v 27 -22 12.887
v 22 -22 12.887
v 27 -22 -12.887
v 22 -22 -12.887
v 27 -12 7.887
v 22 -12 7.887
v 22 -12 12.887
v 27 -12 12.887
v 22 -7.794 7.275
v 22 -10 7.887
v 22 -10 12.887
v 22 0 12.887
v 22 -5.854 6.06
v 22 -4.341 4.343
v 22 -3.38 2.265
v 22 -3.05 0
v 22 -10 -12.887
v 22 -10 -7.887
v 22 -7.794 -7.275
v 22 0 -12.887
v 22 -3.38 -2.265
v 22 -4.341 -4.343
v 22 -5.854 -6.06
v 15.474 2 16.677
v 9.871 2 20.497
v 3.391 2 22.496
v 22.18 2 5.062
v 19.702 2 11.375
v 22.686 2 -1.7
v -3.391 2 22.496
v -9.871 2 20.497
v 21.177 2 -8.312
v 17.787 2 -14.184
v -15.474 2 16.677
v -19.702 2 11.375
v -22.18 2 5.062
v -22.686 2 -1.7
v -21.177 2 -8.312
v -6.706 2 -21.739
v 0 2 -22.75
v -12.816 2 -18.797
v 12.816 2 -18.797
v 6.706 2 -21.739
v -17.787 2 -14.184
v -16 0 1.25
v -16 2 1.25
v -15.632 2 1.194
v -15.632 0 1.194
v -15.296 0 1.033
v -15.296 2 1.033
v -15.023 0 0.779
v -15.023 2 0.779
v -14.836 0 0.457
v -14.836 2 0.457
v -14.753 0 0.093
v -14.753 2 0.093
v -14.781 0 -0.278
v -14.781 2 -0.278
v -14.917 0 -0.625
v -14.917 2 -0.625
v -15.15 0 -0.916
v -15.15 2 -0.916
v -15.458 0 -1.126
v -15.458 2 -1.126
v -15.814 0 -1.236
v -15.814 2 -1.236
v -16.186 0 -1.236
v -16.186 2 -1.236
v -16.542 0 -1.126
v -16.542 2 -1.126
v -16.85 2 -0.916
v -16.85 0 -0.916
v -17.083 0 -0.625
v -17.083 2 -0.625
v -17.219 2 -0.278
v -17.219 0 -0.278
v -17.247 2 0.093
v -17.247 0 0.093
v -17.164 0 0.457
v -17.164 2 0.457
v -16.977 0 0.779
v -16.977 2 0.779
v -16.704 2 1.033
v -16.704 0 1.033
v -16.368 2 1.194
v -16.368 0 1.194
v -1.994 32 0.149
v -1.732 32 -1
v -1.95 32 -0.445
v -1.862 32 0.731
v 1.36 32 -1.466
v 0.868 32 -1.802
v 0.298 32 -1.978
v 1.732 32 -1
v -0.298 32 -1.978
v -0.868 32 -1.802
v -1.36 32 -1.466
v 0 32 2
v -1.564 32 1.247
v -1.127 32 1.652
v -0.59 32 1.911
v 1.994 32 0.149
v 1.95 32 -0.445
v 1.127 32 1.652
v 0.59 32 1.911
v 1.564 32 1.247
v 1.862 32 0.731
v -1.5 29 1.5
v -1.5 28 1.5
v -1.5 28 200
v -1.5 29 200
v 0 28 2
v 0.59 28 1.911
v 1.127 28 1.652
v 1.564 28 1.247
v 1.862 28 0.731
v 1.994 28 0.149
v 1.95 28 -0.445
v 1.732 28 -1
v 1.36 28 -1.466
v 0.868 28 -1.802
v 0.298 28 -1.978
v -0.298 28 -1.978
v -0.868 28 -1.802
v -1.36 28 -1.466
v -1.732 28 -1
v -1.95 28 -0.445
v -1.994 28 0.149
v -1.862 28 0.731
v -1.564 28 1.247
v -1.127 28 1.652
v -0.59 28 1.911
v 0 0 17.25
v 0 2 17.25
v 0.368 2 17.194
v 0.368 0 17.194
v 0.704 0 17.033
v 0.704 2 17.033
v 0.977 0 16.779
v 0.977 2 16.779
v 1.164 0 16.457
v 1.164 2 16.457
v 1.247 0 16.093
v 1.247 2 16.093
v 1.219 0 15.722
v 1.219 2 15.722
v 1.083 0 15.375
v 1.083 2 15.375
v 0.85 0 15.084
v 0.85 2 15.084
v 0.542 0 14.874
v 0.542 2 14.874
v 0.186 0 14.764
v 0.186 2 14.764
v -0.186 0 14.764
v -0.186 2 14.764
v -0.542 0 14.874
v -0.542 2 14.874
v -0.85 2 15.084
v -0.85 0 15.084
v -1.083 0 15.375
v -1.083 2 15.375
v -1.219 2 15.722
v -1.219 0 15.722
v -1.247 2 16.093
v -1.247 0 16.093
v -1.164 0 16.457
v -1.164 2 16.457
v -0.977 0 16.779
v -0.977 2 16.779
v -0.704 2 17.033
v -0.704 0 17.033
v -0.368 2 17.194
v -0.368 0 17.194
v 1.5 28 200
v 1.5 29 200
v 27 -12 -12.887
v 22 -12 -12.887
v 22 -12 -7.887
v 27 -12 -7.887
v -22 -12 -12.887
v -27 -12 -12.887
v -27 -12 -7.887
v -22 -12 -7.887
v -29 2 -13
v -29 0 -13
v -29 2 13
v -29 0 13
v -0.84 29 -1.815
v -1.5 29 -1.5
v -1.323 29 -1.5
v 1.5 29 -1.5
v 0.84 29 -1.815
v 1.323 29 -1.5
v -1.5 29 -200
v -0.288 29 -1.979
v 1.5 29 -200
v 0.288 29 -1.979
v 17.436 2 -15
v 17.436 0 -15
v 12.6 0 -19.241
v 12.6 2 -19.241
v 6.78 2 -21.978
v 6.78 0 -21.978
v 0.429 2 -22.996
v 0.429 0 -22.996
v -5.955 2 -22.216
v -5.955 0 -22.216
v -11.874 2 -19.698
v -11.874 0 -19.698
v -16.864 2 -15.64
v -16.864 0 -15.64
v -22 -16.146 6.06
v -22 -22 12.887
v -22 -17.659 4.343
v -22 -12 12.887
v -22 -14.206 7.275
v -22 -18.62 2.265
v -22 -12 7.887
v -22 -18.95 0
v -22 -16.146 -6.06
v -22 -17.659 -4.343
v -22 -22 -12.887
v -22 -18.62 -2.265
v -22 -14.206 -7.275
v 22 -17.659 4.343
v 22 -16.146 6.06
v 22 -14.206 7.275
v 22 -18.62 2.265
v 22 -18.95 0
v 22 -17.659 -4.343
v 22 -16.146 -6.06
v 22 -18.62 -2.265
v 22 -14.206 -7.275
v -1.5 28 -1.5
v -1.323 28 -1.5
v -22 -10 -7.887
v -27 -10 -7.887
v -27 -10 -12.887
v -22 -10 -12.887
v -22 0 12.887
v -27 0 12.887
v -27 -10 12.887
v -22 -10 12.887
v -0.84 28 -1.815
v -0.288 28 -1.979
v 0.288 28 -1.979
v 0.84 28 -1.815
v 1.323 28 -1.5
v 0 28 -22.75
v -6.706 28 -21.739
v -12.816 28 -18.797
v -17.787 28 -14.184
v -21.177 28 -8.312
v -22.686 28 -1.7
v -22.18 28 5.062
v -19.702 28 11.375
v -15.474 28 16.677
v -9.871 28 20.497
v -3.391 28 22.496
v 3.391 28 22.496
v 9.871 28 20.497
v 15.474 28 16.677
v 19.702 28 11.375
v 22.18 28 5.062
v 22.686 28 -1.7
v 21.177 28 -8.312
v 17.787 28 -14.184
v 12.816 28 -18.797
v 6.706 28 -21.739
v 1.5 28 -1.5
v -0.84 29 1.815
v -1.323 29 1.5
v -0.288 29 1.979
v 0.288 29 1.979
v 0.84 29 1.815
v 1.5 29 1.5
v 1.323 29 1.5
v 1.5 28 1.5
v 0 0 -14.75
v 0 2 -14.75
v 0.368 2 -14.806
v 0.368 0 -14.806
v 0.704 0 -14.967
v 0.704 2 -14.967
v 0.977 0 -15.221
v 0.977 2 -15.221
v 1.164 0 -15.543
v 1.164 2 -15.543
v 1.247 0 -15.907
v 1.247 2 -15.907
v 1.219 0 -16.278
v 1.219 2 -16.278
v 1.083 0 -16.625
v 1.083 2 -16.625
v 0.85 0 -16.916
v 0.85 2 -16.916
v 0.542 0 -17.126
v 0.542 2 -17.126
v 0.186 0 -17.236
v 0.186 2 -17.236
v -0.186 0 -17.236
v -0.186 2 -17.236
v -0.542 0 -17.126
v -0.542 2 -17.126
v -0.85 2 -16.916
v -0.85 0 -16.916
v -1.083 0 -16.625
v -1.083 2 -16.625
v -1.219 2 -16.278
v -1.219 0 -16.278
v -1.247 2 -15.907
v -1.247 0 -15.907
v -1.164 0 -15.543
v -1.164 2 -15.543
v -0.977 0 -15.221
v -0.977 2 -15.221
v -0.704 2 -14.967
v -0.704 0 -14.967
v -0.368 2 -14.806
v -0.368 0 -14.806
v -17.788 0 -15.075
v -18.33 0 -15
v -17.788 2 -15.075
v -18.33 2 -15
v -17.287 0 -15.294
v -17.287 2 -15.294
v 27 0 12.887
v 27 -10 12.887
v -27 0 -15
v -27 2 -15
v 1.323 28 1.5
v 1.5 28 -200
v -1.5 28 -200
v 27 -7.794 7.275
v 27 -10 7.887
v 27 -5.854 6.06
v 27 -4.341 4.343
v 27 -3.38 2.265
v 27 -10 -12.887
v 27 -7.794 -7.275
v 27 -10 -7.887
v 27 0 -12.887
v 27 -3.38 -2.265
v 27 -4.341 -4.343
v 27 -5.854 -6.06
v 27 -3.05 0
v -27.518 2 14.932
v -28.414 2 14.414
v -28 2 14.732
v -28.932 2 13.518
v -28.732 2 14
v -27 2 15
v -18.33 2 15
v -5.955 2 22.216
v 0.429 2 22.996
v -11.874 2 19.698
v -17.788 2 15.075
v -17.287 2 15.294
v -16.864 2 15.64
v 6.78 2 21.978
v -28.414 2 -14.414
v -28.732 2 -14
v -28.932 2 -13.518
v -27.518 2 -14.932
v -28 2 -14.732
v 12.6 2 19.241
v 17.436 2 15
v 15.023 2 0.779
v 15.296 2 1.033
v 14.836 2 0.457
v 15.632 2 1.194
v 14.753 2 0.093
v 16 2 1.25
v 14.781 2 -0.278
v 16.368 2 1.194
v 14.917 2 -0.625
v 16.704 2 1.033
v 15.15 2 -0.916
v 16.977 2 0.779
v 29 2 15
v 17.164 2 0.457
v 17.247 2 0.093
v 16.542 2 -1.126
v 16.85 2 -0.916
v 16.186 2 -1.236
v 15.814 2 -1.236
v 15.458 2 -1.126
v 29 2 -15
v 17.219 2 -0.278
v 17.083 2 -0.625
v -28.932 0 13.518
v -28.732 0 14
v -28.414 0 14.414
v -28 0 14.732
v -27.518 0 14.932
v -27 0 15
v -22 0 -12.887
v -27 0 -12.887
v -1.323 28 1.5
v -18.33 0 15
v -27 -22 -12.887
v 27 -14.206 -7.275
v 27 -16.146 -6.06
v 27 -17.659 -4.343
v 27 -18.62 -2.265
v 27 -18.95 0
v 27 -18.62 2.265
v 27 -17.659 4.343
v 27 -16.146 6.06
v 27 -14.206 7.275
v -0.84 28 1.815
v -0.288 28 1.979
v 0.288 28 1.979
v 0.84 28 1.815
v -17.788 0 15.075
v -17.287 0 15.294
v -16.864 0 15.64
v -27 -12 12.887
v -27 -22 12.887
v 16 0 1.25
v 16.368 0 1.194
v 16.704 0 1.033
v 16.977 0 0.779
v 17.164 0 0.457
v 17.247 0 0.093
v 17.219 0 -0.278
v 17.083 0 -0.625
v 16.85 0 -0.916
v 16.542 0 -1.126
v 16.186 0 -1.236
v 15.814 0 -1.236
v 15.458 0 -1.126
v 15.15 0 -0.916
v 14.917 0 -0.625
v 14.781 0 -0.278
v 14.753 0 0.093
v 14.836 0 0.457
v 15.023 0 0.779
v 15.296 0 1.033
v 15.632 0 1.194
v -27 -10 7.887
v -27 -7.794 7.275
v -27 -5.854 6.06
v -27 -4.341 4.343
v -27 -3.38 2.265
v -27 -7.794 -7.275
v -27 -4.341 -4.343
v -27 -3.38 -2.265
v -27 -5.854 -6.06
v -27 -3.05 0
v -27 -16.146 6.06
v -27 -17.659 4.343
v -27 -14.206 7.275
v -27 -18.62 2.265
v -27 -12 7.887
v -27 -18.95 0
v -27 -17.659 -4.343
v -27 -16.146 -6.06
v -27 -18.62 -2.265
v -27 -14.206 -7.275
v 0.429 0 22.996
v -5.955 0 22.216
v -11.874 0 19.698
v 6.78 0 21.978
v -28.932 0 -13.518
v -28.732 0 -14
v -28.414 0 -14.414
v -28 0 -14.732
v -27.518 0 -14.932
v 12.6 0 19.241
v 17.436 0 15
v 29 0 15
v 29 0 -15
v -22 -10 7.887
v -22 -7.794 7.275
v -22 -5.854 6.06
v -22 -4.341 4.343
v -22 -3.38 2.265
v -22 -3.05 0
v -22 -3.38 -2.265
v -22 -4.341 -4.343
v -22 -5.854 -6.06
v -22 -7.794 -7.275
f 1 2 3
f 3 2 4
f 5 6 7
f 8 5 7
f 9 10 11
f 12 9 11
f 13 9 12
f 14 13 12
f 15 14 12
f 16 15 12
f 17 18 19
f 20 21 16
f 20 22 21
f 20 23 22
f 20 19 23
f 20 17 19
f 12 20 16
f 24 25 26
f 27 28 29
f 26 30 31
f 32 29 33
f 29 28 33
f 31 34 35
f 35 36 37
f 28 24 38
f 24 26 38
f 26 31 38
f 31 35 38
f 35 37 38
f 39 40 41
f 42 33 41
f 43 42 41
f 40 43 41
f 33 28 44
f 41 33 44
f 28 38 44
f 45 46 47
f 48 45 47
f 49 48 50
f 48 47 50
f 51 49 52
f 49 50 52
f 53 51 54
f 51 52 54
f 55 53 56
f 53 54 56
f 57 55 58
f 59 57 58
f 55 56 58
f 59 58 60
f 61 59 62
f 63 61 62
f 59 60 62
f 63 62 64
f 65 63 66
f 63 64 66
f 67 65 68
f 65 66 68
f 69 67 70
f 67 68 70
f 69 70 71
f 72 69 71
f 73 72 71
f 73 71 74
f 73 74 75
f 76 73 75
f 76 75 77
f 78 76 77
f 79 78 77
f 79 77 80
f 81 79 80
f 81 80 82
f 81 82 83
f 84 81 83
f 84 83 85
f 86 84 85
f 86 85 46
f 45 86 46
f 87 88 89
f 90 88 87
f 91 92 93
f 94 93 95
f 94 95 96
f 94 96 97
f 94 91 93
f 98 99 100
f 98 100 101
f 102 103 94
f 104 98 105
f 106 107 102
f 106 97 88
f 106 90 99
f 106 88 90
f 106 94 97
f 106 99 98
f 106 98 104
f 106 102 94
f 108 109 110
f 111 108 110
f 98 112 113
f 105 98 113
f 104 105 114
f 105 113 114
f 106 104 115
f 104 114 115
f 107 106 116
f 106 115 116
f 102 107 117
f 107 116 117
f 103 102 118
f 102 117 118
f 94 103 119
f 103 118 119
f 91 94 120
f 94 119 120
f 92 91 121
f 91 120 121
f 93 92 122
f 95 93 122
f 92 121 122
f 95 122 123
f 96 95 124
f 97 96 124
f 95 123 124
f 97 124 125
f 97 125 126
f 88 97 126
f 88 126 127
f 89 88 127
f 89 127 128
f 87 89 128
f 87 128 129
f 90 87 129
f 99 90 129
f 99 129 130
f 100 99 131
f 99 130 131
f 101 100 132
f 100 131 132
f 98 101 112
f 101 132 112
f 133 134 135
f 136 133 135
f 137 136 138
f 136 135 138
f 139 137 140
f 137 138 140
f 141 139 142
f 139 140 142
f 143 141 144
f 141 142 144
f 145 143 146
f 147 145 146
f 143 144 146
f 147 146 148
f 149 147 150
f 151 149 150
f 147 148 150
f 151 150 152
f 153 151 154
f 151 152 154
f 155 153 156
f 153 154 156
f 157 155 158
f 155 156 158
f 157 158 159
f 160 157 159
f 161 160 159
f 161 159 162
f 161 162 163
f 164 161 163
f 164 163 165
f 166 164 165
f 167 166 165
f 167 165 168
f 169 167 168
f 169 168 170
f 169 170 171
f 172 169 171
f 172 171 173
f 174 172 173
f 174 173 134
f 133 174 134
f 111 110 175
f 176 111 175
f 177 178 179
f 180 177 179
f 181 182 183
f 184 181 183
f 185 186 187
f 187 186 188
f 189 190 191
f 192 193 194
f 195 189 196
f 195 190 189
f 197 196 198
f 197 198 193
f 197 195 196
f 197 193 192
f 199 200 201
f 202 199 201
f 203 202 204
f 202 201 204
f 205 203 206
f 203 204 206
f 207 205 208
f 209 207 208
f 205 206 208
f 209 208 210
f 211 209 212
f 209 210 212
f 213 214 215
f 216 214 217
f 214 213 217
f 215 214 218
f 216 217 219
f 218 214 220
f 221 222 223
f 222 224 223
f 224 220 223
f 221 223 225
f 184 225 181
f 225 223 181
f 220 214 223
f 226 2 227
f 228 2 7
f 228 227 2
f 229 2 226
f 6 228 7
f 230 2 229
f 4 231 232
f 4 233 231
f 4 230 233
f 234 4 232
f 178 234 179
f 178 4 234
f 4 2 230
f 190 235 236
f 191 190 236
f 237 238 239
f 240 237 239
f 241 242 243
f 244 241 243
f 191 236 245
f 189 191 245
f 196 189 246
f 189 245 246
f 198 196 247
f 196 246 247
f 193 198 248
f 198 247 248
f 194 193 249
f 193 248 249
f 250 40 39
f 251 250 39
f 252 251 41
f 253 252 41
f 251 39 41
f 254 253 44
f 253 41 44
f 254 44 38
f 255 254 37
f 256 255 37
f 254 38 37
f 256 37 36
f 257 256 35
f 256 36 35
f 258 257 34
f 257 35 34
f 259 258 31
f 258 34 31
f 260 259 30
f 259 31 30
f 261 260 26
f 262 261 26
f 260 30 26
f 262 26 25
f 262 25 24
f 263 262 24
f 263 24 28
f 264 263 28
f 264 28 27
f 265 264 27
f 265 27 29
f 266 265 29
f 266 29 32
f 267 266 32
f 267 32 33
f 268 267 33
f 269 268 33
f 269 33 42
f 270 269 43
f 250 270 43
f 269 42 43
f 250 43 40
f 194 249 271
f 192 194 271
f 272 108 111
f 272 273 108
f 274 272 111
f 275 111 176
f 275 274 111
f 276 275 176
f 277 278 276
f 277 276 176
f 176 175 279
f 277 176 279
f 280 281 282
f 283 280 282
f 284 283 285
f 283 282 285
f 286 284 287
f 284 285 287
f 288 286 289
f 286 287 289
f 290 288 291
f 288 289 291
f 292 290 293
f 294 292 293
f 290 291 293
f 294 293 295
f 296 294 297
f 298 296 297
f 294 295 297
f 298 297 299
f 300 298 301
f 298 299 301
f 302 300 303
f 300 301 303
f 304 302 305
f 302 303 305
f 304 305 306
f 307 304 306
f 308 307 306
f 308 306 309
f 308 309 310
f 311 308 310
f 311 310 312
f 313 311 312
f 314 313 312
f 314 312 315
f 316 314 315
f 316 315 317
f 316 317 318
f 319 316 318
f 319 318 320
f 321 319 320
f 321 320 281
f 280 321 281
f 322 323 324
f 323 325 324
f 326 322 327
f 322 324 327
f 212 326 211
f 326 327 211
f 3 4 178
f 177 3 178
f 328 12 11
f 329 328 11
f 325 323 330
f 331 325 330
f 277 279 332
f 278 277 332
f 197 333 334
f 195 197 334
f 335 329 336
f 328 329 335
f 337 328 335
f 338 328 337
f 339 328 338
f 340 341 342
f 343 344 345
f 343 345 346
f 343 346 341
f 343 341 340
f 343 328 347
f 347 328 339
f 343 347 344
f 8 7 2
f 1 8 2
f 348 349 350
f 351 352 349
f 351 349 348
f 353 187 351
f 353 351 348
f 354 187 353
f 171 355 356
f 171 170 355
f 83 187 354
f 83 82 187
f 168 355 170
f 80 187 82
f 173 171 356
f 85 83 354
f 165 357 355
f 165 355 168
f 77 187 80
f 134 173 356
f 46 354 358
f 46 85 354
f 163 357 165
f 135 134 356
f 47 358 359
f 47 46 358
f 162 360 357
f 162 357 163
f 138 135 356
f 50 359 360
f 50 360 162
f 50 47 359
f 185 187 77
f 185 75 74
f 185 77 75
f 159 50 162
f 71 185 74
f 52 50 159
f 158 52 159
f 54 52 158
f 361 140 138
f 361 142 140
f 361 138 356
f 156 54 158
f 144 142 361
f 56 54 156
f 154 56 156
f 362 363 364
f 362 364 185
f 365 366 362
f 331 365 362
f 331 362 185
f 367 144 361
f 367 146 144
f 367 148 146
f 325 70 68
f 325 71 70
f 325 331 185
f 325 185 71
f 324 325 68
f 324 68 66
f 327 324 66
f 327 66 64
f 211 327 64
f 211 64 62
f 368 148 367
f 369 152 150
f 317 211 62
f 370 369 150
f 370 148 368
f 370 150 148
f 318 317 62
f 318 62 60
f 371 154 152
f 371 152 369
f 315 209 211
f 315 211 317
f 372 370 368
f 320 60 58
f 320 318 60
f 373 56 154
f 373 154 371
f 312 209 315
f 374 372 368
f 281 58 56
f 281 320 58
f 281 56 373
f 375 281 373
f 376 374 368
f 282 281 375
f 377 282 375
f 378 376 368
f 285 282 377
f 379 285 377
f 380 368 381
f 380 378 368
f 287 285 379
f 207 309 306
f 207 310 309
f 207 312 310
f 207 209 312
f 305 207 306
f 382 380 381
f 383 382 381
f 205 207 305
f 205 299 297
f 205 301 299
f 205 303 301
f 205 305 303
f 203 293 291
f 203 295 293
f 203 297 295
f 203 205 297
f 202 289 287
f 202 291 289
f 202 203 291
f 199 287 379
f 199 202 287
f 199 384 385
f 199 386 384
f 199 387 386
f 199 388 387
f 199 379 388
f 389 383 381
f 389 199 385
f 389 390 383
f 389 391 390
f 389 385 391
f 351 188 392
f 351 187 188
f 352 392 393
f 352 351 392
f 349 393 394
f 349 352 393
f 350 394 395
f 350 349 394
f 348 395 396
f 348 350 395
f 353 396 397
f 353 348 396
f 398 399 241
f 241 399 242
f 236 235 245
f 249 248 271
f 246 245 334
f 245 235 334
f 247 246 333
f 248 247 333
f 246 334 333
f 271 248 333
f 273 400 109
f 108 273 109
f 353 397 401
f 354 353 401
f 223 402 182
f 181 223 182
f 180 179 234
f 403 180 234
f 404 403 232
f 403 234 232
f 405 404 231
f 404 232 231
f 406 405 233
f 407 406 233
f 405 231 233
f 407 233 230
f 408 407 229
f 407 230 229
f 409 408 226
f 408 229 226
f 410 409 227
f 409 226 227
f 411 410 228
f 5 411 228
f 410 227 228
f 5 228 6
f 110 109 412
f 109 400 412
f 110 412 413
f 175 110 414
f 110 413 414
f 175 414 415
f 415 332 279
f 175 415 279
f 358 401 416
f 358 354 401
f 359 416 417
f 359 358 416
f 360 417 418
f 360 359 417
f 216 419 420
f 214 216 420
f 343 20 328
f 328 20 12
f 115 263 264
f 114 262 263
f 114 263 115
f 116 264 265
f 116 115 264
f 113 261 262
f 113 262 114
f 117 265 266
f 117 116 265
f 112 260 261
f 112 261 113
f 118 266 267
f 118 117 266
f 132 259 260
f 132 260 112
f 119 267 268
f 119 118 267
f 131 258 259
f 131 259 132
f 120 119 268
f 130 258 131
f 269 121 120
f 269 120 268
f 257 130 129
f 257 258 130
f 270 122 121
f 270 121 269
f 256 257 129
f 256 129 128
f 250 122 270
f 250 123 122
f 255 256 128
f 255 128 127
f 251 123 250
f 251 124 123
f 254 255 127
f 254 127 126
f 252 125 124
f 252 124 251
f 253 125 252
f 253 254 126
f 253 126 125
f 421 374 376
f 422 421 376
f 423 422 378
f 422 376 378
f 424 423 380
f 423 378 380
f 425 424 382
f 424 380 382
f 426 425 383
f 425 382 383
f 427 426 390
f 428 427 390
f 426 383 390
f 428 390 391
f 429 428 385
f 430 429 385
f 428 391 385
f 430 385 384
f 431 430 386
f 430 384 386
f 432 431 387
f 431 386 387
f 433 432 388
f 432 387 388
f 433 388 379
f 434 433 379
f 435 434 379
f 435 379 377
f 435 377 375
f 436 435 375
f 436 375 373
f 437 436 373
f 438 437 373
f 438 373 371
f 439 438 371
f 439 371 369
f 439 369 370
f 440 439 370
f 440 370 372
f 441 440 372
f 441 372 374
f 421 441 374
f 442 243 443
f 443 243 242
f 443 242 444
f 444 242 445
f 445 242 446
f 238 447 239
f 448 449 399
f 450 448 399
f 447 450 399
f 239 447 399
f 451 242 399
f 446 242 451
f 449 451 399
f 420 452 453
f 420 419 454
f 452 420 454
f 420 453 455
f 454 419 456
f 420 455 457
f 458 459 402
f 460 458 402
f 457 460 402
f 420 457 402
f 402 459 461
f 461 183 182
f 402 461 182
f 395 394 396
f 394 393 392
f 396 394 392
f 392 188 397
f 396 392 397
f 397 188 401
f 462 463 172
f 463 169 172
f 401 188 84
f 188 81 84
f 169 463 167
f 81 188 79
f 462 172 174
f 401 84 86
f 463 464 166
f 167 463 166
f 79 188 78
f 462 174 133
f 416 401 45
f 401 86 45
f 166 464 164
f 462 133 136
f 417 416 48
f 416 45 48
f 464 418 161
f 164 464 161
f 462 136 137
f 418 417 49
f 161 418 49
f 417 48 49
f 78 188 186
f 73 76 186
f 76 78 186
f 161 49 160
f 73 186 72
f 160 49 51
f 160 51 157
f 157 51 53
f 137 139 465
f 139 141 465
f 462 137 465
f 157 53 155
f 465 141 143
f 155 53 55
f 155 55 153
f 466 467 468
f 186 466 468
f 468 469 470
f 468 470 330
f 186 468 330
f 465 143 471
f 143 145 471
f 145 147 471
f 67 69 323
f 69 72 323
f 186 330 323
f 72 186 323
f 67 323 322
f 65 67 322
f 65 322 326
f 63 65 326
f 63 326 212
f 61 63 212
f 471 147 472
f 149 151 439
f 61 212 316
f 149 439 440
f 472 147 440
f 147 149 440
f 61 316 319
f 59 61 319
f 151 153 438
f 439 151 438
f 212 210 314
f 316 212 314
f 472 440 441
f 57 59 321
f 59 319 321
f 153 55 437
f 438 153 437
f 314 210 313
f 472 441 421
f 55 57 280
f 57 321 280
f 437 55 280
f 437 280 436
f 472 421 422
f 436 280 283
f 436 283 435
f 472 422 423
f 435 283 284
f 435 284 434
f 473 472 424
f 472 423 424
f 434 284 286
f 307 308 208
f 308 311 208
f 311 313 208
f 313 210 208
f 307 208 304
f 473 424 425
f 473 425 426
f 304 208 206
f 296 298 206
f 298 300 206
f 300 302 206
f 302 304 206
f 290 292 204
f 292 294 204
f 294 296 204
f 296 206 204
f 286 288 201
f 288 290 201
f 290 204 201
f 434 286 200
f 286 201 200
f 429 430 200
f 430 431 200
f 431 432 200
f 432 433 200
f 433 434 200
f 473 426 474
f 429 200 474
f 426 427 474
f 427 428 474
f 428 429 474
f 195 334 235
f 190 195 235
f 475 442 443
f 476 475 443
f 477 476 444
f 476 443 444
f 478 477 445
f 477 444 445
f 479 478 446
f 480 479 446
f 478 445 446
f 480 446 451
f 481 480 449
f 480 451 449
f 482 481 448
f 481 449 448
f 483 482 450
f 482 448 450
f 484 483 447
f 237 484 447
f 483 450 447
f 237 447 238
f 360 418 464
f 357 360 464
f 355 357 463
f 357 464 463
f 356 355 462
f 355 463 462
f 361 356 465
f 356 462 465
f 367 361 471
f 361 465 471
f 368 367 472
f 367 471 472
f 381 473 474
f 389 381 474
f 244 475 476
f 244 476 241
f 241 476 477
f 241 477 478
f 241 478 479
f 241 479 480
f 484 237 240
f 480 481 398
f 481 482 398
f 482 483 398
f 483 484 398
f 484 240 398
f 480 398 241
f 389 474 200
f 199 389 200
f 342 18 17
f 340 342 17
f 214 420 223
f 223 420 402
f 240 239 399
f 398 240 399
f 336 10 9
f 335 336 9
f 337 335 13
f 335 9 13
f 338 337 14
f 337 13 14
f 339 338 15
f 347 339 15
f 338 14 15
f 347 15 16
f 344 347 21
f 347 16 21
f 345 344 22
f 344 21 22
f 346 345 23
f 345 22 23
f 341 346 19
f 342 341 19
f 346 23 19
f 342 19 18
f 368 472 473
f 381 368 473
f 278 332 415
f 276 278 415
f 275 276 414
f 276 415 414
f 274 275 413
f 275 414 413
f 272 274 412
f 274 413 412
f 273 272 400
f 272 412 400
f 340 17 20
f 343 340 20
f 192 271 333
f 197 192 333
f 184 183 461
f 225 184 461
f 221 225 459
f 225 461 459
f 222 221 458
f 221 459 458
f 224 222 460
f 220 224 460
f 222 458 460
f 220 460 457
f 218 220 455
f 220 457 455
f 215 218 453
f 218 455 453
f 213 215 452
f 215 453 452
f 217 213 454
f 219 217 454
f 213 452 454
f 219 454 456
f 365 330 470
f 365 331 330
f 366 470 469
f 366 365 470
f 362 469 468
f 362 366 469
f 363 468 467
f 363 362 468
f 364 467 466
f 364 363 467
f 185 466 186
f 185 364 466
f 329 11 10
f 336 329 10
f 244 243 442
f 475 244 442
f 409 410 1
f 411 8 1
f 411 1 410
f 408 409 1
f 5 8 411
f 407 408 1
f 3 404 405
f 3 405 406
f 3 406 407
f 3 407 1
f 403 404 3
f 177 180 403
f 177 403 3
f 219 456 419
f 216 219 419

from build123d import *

# Parameters (mm, degrees)
BOSS_EXTRUDE1_DEPTH   = 2
BOSS_EXTRUDE2_DEPTH   = 27
BOSS_EXTRUDE2_2_DEPTH = 27
SKETCH4_W             = 44
SKETCH4_H             = 31.621569558
CUT_EXTRUDE1_DEPTH    = 52.116205304
SKETCH5_R             = 1.25
CUT_EXTRUDE2_DEPTH    = 45.11349
SKETCH6_R             = 22.75
BOSS_EXTRUDE3_DEPTH   = 26
SKETCH7_R             = 2
BOSS_EXTRUDE4_DEPTH   = 4
FILLET1_R             = 2
BOSS_EXTRUDE5_DEPTH   = 1
BOSS_EXTRUDE5_2_DEPTH = 1


with BuildPart() as part:
    # Sketch1 → Boss-Extrude1 (new body)
    with BuildSketch(Plane(origin=(0, 0, 0), x_dir=(1, 0, 0), z_dir=(0, 1, 0))):
        with BuildLine():
            Line((-17.435595774, 15), (-29, 15))
            Line((-29, 15), (-29, -15))
            Line((-29, -15), (-17.435595774, -15))
            ThreePointArc((-17.435595774, -15), (0, -23), (17.435595774, -15))
            Line((17.435595774, -15), (29, -15))
            Line((29, -15), (29, 15))
            Line((29, 15), (17.435595774, 15))
            ThreePointArc((17.435595774, 15), (0, 23), (-17.435595774, 15))
        make_face()
    extrude(amount=BOSS_EXTRUDE1_DEPTH)

    # Sketch5 → Cut-Extrude2 (cut, through all)
    with BuildSketch(Plane(origin=(0, 2, 0), x_dir=(1, 0, 0), z_dir=(0, 1, 0))):
        with Locations(Location((0, 16, 0), (0, 0, 270))):
            Circle(SKETCH5_R)
        with Locations(Location((16, 0, 0), (0, 0, 270))):
            Circle(SKETCH5_R)
        with Locations(Location((0, -16, 0), (0, 0, 270))):
            Circle(SKETCH5_R)
        with Locations(Location((-16, 0, 0), (0, 0, 270))):
            Circle(SKETCH5_R)
    extrude(amount=-CUT_EXTRUDE2_DEPTH, mode=Mode.SUBTRACT)

    # Fillet1
    fillet1_edges = [part.edges().sort_by_distance(p)[0] for p in [
        (-29, 1, 15),
        (-29, 1, -15),
        (-17.435595774, 1, -15),
        (-17.435595774, 1, 15),
    ]]
    fillet(fillet1_edges, radius=FILLET1_R)


with BuildPart() as body_2:
    # Sketch2 → Boss-Extrude2 (new, symmetric)
    with BuildSketch(Plane.ZY):
        with BuildLine():
            Line((-12.886856154, -10), (-12.886856154, 0))
            Line((-12.886856154, 0), (12.886856154, 0))
            Line((12.886856154, 0), (12.886856154, -10))
            Line((12.886856154, -10), (7.886856154, -10))
            ThreePointArc((7.886856154, -10), (0, -3.05), (-7.886856154, -10))
            Line((-7.886856154, -10), (-12.886856154, -10))
        make_face()
    extrude(amount=BOSS_EXTRUDE2_DEPTH, both=True)


with BuildPart() as body_3:
    # Sketch2 → Boss-Extrude2 2 (new, symmetric)
    with BuildSketch(Plane.ZY):
        with BuildLine():
            Line((7.886856154, -12), (12.886856154, -12))
            Line((12.886856154, -12), (12.886856154, -22))
            Line((12.886856154, -22), (-12.886856154, -22))
            Line((-12.886856154, -22), (-12.886856154, -12))
            Line((-12.886856154, -12), (-7.886856154, -12))
            ThreePointArc((-7.886856154, -12), (0, -18.95), (7.886856154, -12))
        make_face()
    extrude(amount=BOSS_EXTRUDE2_2_DEPTH, both=True)


with BuildPart() as cut_extrude1_tool:
    # Sketch4 → Cut-Extrude1 (new, through all)
    with BuildSketch(Plane(origin=(0, 0, -12.886856154), x_dir=(-1, 0, 0), z_dir=(0, 0, -1))):
        with Locations((0, -15.810784779)):
            Rectangle(SKETCH4_W, SKETCH4_H)
    extrude(amount=-CUT_EXTRUDE1_DEPTH)


with BuildPart() as body_2_1:
    add(body_2.part)

    # Cut-Extrude1: cut by cut_extrude1_tool
    add(cut_extrude1_tool.part, mode=Mode.SUBTRACT)


with BuildPart() as body_3_1:
    add(body_3.part)

    # Cut-Extrude1: cut by cut_extrude1_tool
    add(cut_extrude1_tool.part, mode=Mode.SUBTRACT)


with BuildPart() as cut_extrude1_piece_1:
    # of the separate pieces the step leaves, piece 1, a body of its own (cut_extrude1_pieces)
    add(body_2_1.part.solids().sort_by_distance((27, -10, -7.886856154))[0])


with BuildPart() as cut_extrude1_piece_2:
    # of the separate pieces the step leaves, piece 2, a body of its own (cut_extrude1_pieces)
    add(body_2_1.part.solids().sort_by_distance((-22, -10, -7.886856154))[0])


with BuildPart() as cut_extrude1_piece_1_of_body_3:
    # of the separate pieces the step leaves, piece 1, a body of its own (cut_extrude1_pieces_of_body_3)
    add(body_3_1.part.solids().sort_by_distance((27, -12, 7.886856154))[0])


with BuildPart() as cut_extrude1_piece_2_of_body_3:
    # of the separate pieces the step leaves, piece 2, a body of its own (cut_extrude1_pieces_of_body_3)
    add(body_3_1.part.solids().sort_by_distance((-22, -12, 7.886856154))[0])


with BuildPart() as body_6:
    # Sketch6 → Boss-Extrude3 (new body)
    with BuildSketch(Plane(origin=(0, 2, 0), x_dir=(1, 0, 0), z_dir=(0, 1, 0))):
        with Locations(Location((0, 0, 0), (0, 0, 90))):
            Circle(SKETCH6_R)
    extrude(amount=BOSS_EXTRUDE3_DEPTH)

    # Sketch7 → Boss-Extrude4 (add)
    with BuildSketch(Plane(origin=(0, 28, 0), x_dir=(1, 0, 0), z_dir=(0, 1, 0))):
        with Locations(Location((0, 0, 0), (0, 0, 270))):
            Circle(SKETCH7_R)
    extrude(amount=BOSS_EXTRUDE4_DEPTH)


with BuildPart() as body_7:
    # Sketch8 → Boss-Extrude5 (new body)
    with BuildSketch(Plane(origin=(0, 28, 0), x_dir=(1, 0, 0), z_dir=(0, 1, 0))):
        with BuildLine():
            Line((-1.5, -1.5), (-1.5, -200))
            Line((-1.5, -200), (1.5, -200))
            Line((1.5, -200), (1.5, -1.5))
            Line((1.5, -1.5), (1.322875656, -1.5))
            ThreePointArc((1.322875656, -1.5), (0, -2), (-1.322875656, -1.5))
            Line((-1.322875656, -1.5), (-1.5, -1.5))
        make_face()
    extrude(amount=BOSS_EXTRUDE5_DEPTH)


with BuildPart() as body_8:
    # Sketch8 → Boss-Extrude5 2 (new body)
    with BuildSketch(Plane(origin=(0, 28, 0), x_dir=(1, 0, 0), z_dir=(0, 1, 0))):
        with BuildLine():
            Line((-1.5, 200), (-1.5, 1.5))
            Line((-1.5, 1.5), (-1.322875656, 1.5))
            ThreePointArc((-1.322875656, 1.5), (0, 2), (1.322875656, 1.5))
            Line((1.322875656, 1.5), (1.5, 1.5))
            Line((1.5, 1.5), (1.5, 200))
            Line((1.5, 200), (-1.5, 200))
        make_face()
    extrude(amount=BOSS_EXTRUDE5_2_DEPTH)


solid = Compound([part.part, cut_extrude1_piece_1.part, cut_extrude1_piece_2.part, cut_extrude1_piece_1_of_body_3.part, cut_extrude1_piece_2_of_body_3.part, body_6.part, body_7.part, body_8.part])
